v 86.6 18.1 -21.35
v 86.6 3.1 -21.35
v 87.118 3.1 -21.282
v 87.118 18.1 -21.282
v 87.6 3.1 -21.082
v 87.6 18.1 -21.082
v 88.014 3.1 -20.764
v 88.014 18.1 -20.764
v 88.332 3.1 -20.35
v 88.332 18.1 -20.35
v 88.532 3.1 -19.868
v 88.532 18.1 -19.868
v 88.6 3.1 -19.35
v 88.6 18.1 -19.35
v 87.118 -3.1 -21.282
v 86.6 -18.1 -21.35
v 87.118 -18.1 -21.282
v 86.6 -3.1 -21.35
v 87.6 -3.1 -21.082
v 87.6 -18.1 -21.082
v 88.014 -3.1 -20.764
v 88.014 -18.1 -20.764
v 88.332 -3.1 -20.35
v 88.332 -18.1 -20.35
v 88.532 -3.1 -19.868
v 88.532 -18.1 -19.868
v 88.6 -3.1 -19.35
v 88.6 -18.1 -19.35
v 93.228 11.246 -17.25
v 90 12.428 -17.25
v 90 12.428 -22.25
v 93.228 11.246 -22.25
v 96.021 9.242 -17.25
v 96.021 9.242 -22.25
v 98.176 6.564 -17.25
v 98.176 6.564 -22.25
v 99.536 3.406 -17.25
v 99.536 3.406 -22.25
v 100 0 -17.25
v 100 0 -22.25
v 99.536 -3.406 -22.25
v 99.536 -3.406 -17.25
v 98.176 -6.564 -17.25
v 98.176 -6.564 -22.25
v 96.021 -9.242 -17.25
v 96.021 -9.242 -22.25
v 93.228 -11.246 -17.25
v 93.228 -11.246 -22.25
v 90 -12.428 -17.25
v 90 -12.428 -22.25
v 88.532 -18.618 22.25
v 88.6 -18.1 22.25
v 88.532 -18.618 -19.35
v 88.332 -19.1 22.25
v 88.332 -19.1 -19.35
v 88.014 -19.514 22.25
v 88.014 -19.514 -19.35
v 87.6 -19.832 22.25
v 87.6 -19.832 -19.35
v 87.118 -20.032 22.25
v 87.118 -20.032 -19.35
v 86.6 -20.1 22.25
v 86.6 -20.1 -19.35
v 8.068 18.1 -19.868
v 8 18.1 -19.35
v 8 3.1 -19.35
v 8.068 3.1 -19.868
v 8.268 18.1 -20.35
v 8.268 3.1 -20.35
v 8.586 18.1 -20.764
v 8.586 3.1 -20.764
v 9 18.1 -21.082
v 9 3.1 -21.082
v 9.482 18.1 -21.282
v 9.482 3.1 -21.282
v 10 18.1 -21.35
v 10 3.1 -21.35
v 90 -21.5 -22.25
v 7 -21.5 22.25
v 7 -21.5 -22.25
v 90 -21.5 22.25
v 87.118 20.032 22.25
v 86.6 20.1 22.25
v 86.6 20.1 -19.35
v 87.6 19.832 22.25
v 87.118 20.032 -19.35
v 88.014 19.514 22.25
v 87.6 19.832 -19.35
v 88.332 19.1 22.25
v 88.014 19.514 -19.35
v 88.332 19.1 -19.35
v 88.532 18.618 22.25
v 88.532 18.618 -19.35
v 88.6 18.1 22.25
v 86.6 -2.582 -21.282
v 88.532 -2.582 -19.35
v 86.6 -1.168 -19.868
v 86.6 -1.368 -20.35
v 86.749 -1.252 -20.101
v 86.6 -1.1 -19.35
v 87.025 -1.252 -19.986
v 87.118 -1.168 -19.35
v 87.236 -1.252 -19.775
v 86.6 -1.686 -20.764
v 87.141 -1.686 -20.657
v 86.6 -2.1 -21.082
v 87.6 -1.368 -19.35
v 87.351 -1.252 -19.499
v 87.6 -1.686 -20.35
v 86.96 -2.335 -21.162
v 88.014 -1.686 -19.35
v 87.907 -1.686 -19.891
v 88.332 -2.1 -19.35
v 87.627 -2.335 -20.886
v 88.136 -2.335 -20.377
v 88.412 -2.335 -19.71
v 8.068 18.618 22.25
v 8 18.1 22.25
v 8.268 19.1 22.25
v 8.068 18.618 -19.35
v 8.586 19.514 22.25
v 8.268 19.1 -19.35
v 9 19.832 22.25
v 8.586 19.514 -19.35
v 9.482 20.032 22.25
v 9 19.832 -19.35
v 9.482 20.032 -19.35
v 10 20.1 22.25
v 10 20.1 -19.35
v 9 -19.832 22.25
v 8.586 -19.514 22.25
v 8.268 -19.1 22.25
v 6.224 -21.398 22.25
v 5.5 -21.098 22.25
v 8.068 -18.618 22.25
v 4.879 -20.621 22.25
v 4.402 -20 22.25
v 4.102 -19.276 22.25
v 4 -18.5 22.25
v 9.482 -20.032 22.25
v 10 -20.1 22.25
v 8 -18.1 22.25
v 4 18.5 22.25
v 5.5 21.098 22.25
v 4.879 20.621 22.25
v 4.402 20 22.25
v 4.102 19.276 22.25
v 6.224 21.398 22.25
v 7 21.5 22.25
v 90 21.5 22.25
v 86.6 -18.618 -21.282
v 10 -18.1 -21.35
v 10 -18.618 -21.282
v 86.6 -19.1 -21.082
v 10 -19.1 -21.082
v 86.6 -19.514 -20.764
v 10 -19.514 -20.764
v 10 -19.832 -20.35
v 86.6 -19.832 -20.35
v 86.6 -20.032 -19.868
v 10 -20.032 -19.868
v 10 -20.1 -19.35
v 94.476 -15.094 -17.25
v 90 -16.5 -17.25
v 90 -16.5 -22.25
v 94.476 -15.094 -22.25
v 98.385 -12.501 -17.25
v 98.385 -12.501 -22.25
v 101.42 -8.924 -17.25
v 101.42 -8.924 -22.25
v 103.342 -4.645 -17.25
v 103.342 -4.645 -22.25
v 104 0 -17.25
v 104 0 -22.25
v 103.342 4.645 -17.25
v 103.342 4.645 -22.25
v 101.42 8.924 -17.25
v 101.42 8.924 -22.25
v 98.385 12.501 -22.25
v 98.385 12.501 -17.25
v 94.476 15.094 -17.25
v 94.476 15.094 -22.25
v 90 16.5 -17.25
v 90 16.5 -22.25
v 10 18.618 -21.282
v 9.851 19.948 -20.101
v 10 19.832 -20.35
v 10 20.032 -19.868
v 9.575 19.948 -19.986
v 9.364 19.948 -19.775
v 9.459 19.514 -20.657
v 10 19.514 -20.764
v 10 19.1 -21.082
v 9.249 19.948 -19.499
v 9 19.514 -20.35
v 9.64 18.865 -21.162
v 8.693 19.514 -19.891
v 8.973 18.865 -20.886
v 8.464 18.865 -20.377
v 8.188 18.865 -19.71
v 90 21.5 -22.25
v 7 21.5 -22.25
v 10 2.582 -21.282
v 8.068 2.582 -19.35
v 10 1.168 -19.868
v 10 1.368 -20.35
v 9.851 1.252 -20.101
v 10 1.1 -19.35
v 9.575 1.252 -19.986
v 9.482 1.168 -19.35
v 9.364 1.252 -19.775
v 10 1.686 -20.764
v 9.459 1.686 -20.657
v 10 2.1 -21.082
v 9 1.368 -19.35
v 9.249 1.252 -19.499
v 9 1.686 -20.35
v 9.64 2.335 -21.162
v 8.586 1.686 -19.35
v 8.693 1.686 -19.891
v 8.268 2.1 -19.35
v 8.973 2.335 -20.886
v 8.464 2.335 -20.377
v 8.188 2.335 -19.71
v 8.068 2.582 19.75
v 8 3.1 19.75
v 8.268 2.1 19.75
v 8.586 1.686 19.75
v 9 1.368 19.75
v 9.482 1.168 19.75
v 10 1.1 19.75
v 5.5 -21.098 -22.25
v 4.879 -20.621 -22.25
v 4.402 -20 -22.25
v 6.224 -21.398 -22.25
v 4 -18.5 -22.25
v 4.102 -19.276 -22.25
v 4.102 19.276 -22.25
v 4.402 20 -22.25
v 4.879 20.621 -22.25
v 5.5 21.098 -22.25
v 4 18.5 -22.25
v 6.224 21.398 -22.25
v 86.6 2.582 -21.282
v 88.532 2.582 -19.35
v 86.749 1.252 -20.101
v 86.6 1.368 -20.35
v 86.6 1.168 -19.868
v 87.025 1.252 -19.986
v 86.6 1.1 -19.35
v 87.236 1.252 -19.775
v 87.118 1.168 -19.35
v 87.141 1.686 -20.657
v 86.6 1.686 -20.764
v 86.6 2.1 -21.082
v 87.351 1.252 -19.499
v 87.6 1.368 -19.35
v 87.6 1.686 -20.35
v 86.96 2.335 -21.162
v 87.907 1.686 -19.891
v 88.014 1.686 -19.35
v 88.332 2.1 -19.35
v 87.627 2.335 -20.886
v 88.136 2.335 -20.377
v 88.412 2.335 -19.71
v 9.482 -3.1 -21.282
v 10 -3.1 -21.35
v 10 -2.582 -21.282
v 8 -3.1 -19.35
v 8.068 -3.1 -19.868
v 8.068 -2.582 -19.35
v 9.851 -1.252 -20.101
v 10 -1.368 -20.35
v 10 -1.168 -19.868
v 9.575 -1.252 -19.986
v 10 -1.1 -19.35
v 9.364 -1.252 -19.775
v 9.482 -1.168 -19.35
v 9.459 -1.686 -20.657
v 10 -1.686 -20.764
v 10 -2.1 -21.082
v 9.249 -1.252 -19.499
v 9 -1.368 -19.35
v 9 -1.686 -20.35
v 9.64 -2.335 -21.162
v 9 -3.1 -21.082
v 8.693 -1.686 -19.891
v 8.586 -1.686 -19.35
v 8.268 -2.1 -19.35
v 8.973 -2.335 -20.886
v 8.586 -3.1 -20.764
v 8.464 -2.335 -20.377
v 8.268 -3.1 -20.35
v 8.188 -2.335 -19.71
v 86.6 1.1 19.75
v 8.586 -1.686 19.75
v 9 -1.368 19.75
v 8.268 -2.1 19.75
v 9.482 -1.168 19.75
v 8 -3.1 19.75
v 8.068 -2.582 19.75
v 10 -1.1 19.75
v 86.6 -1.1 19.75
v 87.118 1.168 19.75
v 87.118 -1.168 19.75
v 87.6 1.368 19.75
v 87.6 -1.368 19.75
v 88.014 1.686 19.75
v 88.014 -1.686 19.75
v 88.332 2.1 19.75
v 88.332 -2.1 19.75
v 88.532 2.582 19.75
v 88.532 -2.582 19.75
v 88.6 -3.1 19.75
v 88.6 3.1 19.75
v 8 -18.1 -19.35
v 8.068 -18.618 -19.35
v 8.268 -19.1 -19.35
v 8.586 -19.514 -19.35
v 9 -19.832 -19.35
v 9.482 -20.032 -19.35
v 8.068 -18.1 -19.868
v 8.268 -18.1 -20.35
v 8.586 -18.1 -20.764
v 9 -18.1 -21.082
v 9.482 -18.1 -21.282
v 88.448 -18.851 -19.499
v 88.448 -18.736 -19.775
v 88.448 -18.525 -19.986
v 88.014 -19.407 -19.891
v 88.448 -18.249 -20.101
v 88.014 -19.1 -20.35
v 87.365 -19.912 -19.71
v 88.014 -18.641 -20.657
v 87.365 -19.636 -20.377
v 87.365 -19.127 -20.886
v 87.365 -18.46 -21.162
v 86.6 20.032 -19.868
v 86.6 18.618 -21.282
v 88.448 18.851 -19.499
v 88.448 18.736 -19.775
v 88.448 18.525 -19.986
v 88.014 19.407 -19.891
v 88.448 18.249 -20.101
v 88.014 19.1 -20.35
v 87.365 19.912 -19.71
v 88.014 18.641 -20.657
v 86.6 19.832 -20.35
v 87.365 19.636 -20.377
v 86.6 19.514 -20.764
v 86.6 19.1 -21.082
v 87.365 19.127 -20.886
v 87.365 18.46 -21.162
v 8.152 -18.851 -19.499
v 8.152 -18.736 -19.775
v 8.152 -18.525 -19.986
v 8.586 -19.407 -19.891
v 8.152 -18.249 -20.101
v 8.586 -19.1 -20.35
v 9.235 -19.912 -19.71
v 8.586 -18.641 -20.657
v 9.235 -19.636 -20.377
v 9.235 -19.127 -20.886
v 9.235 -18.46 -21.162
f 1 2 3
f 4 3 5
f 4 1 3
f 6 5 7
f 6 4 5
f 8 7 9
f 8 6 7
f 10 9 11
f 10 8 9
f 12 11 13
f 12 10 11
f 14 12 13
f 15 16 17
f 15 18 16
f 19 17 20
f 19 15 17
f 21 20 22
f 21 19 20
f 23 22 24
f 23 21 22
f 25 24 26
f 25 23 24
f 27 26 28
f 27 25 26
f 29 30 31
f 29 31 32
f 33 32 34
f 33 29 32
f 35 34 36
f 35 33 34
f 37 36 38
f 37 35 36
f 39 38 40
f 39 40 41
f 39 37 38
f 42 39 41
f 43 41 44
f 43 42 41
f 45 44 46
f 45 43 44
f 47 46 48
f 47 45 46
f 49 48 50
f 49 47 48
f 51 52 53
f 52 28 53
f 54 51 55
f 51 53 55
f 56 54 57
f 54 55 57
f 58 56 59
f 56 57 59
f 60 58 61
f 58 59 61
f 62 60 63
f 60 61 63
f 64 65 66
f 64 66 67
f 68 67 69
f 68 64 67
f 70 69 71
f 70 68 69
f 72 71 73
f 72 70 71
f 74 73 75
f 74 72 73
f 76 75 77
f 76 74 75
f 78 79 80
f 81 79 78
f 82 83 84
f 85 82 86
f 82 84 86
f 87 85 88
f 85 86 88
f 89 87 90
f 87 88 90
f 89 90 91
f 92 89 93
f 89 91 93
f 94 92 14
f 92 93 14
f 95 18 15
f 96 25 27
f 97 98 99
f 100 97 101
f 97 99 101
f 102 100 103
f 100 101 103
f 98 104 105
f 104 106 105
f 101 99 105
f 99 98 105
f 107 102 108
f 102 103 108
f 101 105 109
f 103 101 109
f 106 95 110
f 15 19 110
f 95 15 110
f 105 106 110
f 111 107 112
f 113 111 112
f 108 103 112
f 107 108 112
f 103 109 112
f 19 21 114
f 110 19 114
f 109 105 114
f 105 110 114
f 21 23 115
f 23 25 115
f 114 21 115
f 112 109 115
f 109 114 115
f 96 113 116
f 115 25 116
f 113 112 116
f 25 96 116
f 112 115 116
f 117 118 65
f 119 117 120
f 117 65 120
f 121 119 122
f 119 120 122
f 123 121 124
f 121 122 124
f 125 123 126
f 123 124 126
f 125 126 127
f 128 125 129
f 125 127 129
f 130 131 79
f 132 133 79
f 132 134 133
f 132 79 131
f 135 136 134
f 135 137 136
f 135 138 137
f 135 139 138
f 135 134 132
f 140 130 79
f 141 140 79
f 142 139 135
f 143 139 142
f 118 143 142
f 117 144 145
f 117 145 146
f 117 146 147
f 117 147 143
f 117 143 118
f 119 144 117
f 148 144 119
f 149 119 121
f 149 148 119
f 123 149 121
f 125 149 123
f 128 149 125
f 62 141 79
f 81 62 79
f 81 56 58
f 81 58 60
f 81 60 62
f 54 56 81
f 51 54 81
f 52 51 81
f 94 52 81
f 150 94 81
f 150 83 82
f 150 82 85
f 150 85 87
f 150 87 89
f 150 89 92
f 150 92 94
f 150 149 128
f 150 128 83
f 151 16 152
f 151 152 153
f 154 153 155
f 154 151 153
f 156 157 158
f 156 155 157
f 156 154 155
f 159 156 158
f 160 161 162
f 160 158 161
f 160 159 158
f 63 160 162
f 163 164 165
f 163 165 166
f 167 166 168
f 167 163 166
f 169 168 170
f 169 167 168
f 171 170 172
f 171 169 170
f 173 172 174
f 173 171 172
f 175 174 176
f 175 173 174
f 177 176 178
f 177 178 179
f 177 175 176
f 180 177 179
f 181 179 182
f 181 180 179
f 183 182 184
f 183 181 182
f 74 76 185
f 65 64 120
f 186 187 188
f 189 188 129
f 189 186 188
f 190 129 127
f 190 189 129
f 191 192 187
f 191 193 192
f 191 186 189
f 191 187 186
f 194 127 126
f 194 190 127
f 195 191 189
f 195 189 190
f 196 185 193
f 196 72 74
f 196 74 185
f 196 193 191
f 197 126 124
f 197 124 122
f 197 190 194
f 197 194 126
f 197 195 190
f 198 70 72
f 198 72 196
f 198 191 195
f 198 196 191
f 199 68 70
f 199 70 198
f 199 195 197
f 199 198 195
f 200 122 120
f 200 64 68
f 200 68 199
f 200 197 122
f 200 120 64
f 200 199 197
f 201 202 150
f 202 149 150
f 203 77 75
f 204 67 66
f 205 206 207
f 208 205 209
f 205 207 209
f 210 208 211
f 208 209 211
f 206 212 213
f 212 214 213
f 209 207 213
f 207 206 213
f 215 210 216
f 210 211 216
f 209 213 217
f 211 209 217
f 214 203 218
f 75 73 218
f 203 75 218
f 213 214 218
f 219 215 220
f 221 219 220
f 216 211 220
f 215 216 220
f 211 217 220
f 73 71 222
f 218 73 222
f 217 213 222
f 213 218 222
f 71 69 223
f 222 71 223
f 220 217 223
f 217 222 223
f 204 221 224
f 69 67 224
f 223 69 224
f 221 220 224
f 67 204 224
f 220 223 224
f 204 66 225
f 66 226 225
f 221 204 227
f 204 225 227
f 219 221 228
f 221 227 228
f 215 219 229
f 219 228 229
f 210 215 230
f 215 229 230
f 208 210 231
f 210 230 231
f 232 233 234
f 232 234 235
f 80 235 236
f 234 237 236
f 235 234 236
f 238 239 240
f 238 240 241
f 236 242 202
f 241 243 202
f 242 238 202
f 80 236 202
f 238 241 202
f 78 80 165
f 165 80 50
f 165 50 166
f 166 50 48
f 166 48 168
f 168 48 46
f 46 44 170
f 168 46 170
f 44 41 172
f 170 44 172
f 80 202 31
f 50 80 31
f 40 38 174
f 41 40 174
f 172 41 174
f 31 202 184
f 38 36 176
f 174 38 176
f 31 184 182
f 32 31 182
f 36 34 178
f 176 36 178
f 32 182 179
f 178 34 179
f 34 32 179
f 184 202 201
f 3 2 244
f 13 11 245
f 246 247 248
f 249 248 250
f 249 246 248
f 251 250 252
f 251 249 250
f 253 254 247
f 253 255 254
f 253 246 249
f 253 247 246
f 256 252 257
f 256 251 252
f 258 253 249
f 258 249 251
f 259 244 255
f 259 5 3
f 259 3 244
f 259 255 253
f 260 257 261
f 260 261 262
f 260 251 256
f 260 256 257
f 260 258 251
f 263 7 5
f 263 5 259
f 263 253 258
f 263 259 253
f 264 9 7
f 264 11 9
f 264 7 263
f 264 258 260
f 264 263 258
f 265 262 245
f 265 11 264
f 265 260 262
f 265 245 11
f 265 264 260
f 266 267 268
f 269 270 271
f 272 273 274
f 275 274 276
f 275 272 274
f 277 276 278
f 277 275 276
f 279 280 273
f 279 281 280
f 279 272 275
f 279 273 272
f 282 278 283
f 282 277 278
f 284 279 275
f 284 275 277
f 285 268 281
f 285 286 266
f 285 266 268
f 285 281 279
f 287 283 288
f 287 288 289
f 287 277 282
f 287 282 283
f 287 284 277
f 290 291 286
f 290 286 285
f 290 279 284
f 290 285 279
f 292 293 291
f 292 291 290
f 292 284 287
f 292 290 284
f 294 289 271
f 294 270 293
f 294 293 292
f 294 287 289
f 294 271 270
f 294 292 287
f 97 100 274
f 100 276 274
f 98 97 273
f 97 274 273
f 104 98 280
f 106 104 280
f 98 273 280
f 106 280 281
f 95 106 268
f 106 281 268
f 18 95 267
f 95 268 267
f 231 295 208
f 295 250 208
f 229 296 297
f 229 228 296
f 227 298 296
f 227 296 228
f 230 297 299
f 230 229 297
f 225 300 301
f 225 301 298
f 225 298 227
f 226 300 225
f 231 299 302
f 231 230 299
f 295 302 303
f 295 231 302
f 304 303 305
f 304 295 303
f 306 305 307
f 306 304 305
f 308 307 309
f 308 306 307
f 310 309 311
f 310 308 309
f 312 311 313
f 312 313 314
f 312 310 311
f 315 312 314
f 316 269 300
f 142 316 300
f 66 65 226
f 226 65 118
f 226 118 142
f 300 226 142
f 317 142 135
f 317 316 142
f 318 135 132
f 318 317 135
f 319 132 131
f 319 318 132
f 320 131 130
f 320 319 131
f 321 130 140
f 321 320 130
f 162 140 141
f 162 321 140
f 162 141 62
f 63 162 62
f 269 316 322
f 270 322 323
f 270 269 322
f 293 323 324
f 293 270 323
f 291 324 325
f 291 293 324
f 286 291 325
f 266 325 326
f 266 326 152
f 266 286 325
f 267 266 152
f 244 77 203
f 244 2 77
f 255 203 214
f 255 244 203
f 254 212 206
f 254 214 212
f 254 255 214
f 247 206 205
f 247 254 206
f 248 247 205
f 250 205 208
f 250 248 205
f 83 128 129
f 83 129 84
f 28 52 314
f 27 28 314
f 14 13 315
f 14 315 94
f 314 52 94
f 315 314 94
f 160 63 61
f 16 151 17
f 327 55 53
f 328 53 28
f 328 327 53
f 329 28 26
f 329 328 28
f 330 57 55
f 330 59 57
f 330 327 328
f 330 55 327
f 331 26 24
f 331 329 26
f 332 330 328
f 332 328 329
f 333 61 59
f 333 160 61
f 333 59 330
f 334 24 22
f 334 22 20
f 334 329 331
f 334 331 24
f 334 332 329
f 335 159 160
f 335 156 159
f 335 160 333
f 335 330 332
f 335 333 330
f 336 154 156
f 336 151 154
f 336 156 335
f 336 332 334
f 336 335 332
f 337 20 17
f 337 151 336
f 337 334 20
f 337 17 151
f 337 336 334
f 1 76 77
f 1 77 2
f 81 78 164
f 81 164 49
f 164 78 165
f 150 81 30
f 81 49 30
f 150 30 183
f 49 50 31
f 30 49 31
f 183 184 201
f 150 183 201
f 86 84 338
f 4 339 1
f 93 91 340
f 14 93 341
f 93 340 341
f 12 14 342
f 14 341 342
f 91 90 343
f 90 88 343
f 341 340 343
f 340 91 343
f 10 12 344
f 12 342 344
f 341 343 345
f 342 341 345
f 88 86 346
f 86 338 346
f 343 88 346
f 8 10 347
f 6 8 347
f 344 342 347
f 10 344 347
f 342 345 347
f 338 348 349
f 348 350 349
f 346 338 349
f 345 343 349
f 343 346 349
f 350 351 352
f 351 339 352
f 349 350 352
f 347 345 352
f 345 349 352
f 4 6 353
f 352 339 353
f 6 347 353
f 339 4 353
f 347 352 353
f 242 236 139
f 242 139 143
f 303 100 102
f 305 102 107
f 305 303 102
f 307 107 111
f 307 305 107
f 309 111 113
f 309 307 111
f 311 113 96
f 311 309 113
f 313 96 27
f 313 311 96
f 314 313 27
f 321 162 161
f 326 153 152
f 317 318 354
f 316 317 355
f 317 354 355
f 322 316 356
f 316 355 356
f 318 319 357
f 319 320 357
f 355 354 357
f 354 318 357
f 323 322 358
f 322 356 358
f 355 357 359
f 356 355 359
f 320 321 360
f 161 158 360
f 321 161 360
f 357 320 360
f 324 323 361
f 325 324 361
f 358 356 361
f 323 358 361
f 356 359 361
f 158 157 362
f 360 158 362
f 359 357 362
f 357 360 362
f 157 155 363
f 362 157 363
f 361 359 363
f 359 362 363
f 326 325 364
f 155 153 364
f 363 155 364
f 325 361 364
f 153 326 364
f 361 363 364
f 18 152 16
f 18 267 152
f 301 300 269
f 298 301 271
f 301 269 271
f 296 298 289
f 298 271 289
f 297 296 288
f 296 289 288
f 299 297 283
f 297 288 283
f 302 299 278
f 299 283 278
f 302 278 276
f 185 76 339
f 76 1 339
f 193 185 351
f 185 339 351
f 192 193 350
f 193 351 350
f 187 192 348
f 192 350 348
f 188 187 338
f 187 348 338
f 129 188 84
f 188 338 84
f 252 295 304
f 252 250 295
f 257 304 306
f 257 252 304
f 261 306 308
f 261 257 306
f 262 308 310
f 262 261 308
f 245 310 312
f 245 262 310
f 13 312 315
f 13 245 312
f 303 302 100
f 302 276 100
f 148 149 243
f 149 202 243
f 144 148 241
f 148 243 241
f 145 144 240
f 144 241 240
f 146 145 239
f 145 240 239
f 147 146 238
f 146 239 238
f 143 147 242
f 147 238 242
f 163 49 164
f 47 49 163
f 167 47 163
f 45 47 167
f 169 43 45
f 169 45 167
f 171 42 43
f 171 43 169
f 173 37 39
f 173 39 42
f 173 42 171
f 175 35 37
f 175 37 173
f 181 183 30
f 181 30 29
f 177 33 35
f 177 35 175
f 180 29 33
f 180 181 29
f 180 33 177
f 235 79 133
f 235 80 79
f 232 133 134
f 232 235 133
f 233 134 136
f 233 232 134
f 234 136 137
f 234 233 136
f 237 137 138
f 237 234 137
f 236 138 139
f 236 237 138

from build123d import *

# Parameters (mm, degrees)
SKETCH_1_W                  = 86
SKETCH_1_H                  = 43
EXTRUDE_1_DEPTH             = 39.5
EXTRUDE_2_DEPTH             = 5
SKETCH_3_W                  = 80.6
SKETCH_3_H                  = 40.2
CUT_EXTRUDE_1_DEPTH         = 43.6
HOLE_WIZARD_8_3_8_3_1_D     = 8.3
HOLE_WIZARD_8_3_8_3_1_DEPTH = 3.2
FILLET_1_R                  = 3
EXTRUDE_START               = -4
SKETCH_6_R                  = 4.15
EXTRUDE_3_DEPTH             = 4
EXTRUDE_4_DEPTH             = 42
FILLET_2_R                  = 2


with BuildPart() as part:
    # Эскиз1 → Бобышка-Вытянуть1 (new body)
    with BuildSketch(Plane.XY.offset(22.25)):
        with Locations((47, 0)):
            Rectangle(SKETCH_1_W, SKETCH_1_H)
    extrude(amount=-EXTRUDE_1_DEPTH)

    # Эскиз2 → Бобышка-Вытянуть2 (add)
    with BuildSketch(Plane(origin=(0, 0, -17.25), x_dir=(-1, 0, 0), z_dir=(0, 0, -1))):
        with BuildLine():
            Line((-90, -21.5), (-90, -16.5))
            ThreePointArc((-90, -16.5), (-104, 0), (-90, 16.5))
            Line((-90, 16.5), (-90, 21.5))
            Line((-90, 21.5), (-4, 21.5))
            Line((-4, 21.5), (-4, -21.5))
            Line((-4, -21.5), (-90, -21.5))
        make_face()
        with BuildLine():
            Line((-90, -12.428366172), (-90, 12.428366172))
            ThreePointArc((-90, 12.428366172), (-100, 0), (-90, -12.428366172))
        make_face(mode=Mode.SUBTRACT)
    extrude(amount=EXTRUDE_2_DEPTH)

    # Эскиз3 → Вырез-Вытянуть1 (cut)
    with BuildSketch(Plane.XY.offset(22.25)):
        with Locations((48.3, 0)):
            Rectangle(SKETCH_3_W, SKETCH_3_H)
    extrude(amount=-CUT_EXTRUDE_1_DEPTH, mode=Mode.SUBTRACT)

    # Диаметр отверстия Ø8.3 (8.3)1
    with Locations(Plane.ZY.offset(-4)):
        with Locations((0, 0)):
            Hole(HOLE_WIZARD_8_3_8_3_1_D / 2, depth=HOLE_WIZARD_8_3_8_3_1_DEPTH)

    # Скругление1
    fillet_1_edges = [part.edges().sort_by_distance(p)[0] for p in [
        (4, -21.5, 0),
        (4, 21.5, 0),
    ]]
    fillet(fillet_1_edges, radius=FILLET_1_R)

    # Эскиз6 → Бобышка-Вытянуть3 (add)
    with BuildSketch(Plane.ZY.offset(-4).offset(EXTRUDE_START)):
        Circle(SKETCH_6_R)
    extrude(amount=EXTRUDE_3_DEPTH)

    # Эскиз7 → Бобышка-Вытянуть4 (add)
    with BuildSketch(Plane(origin=(0, 0, -22.25), x_dir=(-1, 0, 0), z_dir=(0, 0, -1))):
        Polygon((-90, -1.1), (-90, 1.1), (-4, 1.1), (-4, 0), (-4, -1.1), align=None)
    extrude(amount=-EXTRUDE_4_DEPTH)

    # Скругление2
    fillet_2_edges = [part.edges().sort_by_distance(p)[0] for p in [
        (48.3, -20.1, -21.35),
        (88.6, -20.1, 0.45),
        (8, 10.6, -21.35),
        (8, -20.1, 0.45),
        (48.3, 20.1, -21.35),
        (8, 20.1, 0.45),
        (88.6, -10.6, -21.35),
        (88.6, 20.1, 0.45),
        (88.6, 10.6, -21.35),
        (8, -10.6, -21.35),
        (48.3, -1.1, -21.35),
        (48.3, 1.1, -21.35),
        (8, 1.1, -0.8),
        (88.6, 1.1, -0.8),
        (8, -1.1, -0.8),
        (88.6, -1.1, -0.8),
    ]]
    fillet(fillet_2_edges, radius=FILLET_2_R)


solid = part.part
